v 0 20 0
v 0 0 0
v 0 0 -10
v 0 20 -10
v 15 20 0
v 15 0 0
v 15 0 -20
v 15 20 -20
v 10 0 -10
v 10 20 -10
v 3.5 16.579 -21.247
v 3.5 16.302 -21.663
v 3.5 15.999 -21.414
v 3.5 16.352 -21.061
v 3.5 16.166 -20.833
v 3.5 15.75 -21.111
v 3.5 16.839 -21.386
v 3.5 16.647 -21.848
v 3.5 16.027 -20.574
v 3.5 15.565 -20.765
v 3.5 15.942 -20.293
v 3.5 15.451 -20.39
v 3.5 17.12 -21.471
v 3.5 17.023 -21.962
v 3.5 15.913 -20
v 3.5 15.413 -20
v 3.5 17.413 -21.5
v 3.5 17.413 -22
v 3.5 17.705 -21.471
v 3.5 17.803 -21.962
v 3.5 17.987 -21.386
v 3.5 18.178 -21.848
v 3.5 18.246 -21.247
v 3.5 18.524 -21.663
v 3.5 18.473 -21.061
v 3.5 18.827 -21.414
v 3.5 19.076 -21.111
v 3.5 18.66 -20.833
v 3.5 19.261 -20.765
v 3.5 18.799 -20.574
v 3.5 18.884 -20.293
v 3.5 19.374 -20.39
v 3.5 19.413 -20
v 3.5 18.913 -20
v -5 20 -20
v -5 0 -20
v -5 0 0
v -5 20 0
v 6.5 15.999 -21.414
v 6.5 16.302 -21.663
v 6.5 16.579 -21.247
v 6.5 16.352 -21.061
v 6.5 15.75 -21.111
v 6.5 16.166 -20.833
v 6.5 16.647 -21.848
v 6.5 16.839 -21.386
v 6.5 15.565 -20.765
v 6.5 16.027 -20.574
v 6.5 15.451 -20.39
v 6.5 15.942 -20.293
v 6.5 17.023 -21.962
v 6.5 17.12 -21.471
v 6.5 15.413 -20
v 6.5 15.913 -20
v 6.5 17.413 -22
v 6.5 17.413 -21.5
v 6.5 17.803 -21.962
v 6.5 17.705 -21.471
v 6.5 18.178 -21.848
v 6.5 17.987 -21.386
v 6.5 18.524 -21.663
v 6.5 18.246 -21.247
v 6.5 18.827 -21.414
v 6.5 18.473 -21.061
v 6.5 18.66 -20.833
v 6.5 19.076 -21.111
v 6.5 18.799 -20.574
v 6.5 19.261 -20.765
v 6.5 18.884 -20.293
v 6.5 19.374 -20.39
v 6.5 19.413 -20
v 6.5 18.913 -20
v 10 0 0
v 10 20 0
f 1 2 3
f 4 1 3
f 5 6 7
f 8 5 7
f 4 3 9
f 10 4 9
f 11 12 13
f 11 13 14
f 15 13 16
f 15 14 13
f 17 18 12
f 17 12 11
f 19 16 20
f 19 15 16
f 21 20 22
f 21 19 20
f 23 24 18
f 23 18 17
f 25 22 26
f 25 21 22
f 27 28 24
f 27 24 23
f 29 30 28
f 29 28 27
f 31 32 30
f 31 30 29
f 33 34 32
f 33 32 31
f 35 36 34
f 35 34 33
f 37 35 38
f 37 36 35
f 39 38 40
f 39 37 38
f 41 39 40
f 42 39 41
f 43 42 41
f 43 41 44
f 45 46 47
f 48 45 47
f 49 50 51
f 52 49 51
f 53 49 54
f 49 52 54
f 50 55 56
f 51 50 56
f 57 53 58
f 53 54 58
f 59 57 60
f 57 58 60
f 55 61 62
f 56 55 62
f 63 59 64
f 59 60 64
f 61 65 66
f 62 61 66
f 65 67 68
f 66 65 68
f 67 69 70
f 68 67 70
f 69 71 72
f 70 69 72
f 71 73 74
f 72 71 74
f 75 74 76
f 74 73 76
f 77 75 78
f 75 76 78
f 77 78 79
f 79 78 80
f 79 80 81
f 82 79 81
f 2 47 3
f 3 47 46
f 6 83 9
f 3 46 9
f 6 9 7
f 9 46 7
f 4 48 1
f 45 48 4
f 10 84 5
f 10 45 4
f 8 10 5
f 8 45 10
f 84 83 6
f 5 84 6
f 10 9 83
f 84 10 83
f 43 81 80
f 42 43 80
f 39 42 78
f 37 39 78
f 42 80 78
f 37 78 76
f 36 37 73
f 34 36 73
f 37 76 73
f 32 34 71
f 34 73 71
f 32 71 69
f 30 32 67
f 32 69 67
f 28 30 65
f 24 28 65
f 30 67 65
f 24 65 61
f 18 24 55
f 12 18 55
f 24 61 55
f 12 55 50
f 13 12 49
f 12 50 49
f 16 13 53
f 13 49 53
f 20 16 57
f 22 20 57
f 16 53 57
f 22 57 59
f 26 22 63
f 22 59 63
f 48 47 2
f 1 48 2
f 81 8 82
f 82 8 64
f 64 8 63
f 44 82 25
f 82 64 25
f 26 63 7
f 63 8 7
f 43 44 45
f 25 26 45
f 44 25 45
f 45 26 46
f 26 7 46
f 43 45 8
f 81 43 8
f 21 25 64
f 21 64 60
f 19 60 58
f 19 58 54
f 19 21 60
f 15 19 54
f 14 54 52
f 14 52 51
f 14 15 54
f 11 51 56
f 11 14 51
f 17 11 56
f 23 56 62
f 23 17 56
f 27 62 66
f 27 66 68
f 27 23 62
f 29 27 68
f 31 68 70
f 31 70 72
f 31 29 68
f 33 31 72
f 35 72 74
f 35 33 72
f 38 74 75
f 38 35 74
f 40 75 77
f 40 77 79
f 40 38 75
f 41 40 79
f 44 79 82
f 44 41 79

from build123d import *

# Parameters (mm, degrees)
BOSS_EXTRUDE1_DEPTH      = 20
BOSS_EXTRUDE2_DEPTH      = 1.5
BOSS_EXTRUDE2_DEPTH_BACK = 1.5


with BuildPart() as part:
    # Sketch1 → Boss-Extrude1 (new body)
    with BuildSketch(Plane(origin=(0, 0, 0), x_dir=(1, 0, 0), z_dir=(0, 1, 0))):
        Polygon((0, 0), (0, 10), (10, 10), (10, 0), (15, 0), (15, 20), (-5, 20), (-5, 0), align=None)
    extrude(amount=BOSS_EXTRUDE1_DEPTH)

    # Sketch3 → Boss-Extrude2 (add, two sides)
    with BuildSketch(Plane(origin=(5, 0, 0), x_dir=(0, 0, -1), z_dir=(1, 0, 0))) as boss_extrude2_sk:
        with BuildLine():
            Line((20, 18.912744364), (20, 19.412744364))
            ThreePointArc((20, 19.412744364), (22, 17.412744364), (20, 15.412744364))
            Line((20, 15.412744364), (20, 15.912744364))
            ThreePointArc((20, 15.912744364), (21.5, 17.412744364), (20, 18.912744364))
        make_face()
    extrude(amount=BOSS_EXTRUDE2_DEPTH)
    extrude(boss_extrude2_sk.sketch, amount=-BOSS_EXTRUDE2_DEPTH_BACK)


solid = part.part
